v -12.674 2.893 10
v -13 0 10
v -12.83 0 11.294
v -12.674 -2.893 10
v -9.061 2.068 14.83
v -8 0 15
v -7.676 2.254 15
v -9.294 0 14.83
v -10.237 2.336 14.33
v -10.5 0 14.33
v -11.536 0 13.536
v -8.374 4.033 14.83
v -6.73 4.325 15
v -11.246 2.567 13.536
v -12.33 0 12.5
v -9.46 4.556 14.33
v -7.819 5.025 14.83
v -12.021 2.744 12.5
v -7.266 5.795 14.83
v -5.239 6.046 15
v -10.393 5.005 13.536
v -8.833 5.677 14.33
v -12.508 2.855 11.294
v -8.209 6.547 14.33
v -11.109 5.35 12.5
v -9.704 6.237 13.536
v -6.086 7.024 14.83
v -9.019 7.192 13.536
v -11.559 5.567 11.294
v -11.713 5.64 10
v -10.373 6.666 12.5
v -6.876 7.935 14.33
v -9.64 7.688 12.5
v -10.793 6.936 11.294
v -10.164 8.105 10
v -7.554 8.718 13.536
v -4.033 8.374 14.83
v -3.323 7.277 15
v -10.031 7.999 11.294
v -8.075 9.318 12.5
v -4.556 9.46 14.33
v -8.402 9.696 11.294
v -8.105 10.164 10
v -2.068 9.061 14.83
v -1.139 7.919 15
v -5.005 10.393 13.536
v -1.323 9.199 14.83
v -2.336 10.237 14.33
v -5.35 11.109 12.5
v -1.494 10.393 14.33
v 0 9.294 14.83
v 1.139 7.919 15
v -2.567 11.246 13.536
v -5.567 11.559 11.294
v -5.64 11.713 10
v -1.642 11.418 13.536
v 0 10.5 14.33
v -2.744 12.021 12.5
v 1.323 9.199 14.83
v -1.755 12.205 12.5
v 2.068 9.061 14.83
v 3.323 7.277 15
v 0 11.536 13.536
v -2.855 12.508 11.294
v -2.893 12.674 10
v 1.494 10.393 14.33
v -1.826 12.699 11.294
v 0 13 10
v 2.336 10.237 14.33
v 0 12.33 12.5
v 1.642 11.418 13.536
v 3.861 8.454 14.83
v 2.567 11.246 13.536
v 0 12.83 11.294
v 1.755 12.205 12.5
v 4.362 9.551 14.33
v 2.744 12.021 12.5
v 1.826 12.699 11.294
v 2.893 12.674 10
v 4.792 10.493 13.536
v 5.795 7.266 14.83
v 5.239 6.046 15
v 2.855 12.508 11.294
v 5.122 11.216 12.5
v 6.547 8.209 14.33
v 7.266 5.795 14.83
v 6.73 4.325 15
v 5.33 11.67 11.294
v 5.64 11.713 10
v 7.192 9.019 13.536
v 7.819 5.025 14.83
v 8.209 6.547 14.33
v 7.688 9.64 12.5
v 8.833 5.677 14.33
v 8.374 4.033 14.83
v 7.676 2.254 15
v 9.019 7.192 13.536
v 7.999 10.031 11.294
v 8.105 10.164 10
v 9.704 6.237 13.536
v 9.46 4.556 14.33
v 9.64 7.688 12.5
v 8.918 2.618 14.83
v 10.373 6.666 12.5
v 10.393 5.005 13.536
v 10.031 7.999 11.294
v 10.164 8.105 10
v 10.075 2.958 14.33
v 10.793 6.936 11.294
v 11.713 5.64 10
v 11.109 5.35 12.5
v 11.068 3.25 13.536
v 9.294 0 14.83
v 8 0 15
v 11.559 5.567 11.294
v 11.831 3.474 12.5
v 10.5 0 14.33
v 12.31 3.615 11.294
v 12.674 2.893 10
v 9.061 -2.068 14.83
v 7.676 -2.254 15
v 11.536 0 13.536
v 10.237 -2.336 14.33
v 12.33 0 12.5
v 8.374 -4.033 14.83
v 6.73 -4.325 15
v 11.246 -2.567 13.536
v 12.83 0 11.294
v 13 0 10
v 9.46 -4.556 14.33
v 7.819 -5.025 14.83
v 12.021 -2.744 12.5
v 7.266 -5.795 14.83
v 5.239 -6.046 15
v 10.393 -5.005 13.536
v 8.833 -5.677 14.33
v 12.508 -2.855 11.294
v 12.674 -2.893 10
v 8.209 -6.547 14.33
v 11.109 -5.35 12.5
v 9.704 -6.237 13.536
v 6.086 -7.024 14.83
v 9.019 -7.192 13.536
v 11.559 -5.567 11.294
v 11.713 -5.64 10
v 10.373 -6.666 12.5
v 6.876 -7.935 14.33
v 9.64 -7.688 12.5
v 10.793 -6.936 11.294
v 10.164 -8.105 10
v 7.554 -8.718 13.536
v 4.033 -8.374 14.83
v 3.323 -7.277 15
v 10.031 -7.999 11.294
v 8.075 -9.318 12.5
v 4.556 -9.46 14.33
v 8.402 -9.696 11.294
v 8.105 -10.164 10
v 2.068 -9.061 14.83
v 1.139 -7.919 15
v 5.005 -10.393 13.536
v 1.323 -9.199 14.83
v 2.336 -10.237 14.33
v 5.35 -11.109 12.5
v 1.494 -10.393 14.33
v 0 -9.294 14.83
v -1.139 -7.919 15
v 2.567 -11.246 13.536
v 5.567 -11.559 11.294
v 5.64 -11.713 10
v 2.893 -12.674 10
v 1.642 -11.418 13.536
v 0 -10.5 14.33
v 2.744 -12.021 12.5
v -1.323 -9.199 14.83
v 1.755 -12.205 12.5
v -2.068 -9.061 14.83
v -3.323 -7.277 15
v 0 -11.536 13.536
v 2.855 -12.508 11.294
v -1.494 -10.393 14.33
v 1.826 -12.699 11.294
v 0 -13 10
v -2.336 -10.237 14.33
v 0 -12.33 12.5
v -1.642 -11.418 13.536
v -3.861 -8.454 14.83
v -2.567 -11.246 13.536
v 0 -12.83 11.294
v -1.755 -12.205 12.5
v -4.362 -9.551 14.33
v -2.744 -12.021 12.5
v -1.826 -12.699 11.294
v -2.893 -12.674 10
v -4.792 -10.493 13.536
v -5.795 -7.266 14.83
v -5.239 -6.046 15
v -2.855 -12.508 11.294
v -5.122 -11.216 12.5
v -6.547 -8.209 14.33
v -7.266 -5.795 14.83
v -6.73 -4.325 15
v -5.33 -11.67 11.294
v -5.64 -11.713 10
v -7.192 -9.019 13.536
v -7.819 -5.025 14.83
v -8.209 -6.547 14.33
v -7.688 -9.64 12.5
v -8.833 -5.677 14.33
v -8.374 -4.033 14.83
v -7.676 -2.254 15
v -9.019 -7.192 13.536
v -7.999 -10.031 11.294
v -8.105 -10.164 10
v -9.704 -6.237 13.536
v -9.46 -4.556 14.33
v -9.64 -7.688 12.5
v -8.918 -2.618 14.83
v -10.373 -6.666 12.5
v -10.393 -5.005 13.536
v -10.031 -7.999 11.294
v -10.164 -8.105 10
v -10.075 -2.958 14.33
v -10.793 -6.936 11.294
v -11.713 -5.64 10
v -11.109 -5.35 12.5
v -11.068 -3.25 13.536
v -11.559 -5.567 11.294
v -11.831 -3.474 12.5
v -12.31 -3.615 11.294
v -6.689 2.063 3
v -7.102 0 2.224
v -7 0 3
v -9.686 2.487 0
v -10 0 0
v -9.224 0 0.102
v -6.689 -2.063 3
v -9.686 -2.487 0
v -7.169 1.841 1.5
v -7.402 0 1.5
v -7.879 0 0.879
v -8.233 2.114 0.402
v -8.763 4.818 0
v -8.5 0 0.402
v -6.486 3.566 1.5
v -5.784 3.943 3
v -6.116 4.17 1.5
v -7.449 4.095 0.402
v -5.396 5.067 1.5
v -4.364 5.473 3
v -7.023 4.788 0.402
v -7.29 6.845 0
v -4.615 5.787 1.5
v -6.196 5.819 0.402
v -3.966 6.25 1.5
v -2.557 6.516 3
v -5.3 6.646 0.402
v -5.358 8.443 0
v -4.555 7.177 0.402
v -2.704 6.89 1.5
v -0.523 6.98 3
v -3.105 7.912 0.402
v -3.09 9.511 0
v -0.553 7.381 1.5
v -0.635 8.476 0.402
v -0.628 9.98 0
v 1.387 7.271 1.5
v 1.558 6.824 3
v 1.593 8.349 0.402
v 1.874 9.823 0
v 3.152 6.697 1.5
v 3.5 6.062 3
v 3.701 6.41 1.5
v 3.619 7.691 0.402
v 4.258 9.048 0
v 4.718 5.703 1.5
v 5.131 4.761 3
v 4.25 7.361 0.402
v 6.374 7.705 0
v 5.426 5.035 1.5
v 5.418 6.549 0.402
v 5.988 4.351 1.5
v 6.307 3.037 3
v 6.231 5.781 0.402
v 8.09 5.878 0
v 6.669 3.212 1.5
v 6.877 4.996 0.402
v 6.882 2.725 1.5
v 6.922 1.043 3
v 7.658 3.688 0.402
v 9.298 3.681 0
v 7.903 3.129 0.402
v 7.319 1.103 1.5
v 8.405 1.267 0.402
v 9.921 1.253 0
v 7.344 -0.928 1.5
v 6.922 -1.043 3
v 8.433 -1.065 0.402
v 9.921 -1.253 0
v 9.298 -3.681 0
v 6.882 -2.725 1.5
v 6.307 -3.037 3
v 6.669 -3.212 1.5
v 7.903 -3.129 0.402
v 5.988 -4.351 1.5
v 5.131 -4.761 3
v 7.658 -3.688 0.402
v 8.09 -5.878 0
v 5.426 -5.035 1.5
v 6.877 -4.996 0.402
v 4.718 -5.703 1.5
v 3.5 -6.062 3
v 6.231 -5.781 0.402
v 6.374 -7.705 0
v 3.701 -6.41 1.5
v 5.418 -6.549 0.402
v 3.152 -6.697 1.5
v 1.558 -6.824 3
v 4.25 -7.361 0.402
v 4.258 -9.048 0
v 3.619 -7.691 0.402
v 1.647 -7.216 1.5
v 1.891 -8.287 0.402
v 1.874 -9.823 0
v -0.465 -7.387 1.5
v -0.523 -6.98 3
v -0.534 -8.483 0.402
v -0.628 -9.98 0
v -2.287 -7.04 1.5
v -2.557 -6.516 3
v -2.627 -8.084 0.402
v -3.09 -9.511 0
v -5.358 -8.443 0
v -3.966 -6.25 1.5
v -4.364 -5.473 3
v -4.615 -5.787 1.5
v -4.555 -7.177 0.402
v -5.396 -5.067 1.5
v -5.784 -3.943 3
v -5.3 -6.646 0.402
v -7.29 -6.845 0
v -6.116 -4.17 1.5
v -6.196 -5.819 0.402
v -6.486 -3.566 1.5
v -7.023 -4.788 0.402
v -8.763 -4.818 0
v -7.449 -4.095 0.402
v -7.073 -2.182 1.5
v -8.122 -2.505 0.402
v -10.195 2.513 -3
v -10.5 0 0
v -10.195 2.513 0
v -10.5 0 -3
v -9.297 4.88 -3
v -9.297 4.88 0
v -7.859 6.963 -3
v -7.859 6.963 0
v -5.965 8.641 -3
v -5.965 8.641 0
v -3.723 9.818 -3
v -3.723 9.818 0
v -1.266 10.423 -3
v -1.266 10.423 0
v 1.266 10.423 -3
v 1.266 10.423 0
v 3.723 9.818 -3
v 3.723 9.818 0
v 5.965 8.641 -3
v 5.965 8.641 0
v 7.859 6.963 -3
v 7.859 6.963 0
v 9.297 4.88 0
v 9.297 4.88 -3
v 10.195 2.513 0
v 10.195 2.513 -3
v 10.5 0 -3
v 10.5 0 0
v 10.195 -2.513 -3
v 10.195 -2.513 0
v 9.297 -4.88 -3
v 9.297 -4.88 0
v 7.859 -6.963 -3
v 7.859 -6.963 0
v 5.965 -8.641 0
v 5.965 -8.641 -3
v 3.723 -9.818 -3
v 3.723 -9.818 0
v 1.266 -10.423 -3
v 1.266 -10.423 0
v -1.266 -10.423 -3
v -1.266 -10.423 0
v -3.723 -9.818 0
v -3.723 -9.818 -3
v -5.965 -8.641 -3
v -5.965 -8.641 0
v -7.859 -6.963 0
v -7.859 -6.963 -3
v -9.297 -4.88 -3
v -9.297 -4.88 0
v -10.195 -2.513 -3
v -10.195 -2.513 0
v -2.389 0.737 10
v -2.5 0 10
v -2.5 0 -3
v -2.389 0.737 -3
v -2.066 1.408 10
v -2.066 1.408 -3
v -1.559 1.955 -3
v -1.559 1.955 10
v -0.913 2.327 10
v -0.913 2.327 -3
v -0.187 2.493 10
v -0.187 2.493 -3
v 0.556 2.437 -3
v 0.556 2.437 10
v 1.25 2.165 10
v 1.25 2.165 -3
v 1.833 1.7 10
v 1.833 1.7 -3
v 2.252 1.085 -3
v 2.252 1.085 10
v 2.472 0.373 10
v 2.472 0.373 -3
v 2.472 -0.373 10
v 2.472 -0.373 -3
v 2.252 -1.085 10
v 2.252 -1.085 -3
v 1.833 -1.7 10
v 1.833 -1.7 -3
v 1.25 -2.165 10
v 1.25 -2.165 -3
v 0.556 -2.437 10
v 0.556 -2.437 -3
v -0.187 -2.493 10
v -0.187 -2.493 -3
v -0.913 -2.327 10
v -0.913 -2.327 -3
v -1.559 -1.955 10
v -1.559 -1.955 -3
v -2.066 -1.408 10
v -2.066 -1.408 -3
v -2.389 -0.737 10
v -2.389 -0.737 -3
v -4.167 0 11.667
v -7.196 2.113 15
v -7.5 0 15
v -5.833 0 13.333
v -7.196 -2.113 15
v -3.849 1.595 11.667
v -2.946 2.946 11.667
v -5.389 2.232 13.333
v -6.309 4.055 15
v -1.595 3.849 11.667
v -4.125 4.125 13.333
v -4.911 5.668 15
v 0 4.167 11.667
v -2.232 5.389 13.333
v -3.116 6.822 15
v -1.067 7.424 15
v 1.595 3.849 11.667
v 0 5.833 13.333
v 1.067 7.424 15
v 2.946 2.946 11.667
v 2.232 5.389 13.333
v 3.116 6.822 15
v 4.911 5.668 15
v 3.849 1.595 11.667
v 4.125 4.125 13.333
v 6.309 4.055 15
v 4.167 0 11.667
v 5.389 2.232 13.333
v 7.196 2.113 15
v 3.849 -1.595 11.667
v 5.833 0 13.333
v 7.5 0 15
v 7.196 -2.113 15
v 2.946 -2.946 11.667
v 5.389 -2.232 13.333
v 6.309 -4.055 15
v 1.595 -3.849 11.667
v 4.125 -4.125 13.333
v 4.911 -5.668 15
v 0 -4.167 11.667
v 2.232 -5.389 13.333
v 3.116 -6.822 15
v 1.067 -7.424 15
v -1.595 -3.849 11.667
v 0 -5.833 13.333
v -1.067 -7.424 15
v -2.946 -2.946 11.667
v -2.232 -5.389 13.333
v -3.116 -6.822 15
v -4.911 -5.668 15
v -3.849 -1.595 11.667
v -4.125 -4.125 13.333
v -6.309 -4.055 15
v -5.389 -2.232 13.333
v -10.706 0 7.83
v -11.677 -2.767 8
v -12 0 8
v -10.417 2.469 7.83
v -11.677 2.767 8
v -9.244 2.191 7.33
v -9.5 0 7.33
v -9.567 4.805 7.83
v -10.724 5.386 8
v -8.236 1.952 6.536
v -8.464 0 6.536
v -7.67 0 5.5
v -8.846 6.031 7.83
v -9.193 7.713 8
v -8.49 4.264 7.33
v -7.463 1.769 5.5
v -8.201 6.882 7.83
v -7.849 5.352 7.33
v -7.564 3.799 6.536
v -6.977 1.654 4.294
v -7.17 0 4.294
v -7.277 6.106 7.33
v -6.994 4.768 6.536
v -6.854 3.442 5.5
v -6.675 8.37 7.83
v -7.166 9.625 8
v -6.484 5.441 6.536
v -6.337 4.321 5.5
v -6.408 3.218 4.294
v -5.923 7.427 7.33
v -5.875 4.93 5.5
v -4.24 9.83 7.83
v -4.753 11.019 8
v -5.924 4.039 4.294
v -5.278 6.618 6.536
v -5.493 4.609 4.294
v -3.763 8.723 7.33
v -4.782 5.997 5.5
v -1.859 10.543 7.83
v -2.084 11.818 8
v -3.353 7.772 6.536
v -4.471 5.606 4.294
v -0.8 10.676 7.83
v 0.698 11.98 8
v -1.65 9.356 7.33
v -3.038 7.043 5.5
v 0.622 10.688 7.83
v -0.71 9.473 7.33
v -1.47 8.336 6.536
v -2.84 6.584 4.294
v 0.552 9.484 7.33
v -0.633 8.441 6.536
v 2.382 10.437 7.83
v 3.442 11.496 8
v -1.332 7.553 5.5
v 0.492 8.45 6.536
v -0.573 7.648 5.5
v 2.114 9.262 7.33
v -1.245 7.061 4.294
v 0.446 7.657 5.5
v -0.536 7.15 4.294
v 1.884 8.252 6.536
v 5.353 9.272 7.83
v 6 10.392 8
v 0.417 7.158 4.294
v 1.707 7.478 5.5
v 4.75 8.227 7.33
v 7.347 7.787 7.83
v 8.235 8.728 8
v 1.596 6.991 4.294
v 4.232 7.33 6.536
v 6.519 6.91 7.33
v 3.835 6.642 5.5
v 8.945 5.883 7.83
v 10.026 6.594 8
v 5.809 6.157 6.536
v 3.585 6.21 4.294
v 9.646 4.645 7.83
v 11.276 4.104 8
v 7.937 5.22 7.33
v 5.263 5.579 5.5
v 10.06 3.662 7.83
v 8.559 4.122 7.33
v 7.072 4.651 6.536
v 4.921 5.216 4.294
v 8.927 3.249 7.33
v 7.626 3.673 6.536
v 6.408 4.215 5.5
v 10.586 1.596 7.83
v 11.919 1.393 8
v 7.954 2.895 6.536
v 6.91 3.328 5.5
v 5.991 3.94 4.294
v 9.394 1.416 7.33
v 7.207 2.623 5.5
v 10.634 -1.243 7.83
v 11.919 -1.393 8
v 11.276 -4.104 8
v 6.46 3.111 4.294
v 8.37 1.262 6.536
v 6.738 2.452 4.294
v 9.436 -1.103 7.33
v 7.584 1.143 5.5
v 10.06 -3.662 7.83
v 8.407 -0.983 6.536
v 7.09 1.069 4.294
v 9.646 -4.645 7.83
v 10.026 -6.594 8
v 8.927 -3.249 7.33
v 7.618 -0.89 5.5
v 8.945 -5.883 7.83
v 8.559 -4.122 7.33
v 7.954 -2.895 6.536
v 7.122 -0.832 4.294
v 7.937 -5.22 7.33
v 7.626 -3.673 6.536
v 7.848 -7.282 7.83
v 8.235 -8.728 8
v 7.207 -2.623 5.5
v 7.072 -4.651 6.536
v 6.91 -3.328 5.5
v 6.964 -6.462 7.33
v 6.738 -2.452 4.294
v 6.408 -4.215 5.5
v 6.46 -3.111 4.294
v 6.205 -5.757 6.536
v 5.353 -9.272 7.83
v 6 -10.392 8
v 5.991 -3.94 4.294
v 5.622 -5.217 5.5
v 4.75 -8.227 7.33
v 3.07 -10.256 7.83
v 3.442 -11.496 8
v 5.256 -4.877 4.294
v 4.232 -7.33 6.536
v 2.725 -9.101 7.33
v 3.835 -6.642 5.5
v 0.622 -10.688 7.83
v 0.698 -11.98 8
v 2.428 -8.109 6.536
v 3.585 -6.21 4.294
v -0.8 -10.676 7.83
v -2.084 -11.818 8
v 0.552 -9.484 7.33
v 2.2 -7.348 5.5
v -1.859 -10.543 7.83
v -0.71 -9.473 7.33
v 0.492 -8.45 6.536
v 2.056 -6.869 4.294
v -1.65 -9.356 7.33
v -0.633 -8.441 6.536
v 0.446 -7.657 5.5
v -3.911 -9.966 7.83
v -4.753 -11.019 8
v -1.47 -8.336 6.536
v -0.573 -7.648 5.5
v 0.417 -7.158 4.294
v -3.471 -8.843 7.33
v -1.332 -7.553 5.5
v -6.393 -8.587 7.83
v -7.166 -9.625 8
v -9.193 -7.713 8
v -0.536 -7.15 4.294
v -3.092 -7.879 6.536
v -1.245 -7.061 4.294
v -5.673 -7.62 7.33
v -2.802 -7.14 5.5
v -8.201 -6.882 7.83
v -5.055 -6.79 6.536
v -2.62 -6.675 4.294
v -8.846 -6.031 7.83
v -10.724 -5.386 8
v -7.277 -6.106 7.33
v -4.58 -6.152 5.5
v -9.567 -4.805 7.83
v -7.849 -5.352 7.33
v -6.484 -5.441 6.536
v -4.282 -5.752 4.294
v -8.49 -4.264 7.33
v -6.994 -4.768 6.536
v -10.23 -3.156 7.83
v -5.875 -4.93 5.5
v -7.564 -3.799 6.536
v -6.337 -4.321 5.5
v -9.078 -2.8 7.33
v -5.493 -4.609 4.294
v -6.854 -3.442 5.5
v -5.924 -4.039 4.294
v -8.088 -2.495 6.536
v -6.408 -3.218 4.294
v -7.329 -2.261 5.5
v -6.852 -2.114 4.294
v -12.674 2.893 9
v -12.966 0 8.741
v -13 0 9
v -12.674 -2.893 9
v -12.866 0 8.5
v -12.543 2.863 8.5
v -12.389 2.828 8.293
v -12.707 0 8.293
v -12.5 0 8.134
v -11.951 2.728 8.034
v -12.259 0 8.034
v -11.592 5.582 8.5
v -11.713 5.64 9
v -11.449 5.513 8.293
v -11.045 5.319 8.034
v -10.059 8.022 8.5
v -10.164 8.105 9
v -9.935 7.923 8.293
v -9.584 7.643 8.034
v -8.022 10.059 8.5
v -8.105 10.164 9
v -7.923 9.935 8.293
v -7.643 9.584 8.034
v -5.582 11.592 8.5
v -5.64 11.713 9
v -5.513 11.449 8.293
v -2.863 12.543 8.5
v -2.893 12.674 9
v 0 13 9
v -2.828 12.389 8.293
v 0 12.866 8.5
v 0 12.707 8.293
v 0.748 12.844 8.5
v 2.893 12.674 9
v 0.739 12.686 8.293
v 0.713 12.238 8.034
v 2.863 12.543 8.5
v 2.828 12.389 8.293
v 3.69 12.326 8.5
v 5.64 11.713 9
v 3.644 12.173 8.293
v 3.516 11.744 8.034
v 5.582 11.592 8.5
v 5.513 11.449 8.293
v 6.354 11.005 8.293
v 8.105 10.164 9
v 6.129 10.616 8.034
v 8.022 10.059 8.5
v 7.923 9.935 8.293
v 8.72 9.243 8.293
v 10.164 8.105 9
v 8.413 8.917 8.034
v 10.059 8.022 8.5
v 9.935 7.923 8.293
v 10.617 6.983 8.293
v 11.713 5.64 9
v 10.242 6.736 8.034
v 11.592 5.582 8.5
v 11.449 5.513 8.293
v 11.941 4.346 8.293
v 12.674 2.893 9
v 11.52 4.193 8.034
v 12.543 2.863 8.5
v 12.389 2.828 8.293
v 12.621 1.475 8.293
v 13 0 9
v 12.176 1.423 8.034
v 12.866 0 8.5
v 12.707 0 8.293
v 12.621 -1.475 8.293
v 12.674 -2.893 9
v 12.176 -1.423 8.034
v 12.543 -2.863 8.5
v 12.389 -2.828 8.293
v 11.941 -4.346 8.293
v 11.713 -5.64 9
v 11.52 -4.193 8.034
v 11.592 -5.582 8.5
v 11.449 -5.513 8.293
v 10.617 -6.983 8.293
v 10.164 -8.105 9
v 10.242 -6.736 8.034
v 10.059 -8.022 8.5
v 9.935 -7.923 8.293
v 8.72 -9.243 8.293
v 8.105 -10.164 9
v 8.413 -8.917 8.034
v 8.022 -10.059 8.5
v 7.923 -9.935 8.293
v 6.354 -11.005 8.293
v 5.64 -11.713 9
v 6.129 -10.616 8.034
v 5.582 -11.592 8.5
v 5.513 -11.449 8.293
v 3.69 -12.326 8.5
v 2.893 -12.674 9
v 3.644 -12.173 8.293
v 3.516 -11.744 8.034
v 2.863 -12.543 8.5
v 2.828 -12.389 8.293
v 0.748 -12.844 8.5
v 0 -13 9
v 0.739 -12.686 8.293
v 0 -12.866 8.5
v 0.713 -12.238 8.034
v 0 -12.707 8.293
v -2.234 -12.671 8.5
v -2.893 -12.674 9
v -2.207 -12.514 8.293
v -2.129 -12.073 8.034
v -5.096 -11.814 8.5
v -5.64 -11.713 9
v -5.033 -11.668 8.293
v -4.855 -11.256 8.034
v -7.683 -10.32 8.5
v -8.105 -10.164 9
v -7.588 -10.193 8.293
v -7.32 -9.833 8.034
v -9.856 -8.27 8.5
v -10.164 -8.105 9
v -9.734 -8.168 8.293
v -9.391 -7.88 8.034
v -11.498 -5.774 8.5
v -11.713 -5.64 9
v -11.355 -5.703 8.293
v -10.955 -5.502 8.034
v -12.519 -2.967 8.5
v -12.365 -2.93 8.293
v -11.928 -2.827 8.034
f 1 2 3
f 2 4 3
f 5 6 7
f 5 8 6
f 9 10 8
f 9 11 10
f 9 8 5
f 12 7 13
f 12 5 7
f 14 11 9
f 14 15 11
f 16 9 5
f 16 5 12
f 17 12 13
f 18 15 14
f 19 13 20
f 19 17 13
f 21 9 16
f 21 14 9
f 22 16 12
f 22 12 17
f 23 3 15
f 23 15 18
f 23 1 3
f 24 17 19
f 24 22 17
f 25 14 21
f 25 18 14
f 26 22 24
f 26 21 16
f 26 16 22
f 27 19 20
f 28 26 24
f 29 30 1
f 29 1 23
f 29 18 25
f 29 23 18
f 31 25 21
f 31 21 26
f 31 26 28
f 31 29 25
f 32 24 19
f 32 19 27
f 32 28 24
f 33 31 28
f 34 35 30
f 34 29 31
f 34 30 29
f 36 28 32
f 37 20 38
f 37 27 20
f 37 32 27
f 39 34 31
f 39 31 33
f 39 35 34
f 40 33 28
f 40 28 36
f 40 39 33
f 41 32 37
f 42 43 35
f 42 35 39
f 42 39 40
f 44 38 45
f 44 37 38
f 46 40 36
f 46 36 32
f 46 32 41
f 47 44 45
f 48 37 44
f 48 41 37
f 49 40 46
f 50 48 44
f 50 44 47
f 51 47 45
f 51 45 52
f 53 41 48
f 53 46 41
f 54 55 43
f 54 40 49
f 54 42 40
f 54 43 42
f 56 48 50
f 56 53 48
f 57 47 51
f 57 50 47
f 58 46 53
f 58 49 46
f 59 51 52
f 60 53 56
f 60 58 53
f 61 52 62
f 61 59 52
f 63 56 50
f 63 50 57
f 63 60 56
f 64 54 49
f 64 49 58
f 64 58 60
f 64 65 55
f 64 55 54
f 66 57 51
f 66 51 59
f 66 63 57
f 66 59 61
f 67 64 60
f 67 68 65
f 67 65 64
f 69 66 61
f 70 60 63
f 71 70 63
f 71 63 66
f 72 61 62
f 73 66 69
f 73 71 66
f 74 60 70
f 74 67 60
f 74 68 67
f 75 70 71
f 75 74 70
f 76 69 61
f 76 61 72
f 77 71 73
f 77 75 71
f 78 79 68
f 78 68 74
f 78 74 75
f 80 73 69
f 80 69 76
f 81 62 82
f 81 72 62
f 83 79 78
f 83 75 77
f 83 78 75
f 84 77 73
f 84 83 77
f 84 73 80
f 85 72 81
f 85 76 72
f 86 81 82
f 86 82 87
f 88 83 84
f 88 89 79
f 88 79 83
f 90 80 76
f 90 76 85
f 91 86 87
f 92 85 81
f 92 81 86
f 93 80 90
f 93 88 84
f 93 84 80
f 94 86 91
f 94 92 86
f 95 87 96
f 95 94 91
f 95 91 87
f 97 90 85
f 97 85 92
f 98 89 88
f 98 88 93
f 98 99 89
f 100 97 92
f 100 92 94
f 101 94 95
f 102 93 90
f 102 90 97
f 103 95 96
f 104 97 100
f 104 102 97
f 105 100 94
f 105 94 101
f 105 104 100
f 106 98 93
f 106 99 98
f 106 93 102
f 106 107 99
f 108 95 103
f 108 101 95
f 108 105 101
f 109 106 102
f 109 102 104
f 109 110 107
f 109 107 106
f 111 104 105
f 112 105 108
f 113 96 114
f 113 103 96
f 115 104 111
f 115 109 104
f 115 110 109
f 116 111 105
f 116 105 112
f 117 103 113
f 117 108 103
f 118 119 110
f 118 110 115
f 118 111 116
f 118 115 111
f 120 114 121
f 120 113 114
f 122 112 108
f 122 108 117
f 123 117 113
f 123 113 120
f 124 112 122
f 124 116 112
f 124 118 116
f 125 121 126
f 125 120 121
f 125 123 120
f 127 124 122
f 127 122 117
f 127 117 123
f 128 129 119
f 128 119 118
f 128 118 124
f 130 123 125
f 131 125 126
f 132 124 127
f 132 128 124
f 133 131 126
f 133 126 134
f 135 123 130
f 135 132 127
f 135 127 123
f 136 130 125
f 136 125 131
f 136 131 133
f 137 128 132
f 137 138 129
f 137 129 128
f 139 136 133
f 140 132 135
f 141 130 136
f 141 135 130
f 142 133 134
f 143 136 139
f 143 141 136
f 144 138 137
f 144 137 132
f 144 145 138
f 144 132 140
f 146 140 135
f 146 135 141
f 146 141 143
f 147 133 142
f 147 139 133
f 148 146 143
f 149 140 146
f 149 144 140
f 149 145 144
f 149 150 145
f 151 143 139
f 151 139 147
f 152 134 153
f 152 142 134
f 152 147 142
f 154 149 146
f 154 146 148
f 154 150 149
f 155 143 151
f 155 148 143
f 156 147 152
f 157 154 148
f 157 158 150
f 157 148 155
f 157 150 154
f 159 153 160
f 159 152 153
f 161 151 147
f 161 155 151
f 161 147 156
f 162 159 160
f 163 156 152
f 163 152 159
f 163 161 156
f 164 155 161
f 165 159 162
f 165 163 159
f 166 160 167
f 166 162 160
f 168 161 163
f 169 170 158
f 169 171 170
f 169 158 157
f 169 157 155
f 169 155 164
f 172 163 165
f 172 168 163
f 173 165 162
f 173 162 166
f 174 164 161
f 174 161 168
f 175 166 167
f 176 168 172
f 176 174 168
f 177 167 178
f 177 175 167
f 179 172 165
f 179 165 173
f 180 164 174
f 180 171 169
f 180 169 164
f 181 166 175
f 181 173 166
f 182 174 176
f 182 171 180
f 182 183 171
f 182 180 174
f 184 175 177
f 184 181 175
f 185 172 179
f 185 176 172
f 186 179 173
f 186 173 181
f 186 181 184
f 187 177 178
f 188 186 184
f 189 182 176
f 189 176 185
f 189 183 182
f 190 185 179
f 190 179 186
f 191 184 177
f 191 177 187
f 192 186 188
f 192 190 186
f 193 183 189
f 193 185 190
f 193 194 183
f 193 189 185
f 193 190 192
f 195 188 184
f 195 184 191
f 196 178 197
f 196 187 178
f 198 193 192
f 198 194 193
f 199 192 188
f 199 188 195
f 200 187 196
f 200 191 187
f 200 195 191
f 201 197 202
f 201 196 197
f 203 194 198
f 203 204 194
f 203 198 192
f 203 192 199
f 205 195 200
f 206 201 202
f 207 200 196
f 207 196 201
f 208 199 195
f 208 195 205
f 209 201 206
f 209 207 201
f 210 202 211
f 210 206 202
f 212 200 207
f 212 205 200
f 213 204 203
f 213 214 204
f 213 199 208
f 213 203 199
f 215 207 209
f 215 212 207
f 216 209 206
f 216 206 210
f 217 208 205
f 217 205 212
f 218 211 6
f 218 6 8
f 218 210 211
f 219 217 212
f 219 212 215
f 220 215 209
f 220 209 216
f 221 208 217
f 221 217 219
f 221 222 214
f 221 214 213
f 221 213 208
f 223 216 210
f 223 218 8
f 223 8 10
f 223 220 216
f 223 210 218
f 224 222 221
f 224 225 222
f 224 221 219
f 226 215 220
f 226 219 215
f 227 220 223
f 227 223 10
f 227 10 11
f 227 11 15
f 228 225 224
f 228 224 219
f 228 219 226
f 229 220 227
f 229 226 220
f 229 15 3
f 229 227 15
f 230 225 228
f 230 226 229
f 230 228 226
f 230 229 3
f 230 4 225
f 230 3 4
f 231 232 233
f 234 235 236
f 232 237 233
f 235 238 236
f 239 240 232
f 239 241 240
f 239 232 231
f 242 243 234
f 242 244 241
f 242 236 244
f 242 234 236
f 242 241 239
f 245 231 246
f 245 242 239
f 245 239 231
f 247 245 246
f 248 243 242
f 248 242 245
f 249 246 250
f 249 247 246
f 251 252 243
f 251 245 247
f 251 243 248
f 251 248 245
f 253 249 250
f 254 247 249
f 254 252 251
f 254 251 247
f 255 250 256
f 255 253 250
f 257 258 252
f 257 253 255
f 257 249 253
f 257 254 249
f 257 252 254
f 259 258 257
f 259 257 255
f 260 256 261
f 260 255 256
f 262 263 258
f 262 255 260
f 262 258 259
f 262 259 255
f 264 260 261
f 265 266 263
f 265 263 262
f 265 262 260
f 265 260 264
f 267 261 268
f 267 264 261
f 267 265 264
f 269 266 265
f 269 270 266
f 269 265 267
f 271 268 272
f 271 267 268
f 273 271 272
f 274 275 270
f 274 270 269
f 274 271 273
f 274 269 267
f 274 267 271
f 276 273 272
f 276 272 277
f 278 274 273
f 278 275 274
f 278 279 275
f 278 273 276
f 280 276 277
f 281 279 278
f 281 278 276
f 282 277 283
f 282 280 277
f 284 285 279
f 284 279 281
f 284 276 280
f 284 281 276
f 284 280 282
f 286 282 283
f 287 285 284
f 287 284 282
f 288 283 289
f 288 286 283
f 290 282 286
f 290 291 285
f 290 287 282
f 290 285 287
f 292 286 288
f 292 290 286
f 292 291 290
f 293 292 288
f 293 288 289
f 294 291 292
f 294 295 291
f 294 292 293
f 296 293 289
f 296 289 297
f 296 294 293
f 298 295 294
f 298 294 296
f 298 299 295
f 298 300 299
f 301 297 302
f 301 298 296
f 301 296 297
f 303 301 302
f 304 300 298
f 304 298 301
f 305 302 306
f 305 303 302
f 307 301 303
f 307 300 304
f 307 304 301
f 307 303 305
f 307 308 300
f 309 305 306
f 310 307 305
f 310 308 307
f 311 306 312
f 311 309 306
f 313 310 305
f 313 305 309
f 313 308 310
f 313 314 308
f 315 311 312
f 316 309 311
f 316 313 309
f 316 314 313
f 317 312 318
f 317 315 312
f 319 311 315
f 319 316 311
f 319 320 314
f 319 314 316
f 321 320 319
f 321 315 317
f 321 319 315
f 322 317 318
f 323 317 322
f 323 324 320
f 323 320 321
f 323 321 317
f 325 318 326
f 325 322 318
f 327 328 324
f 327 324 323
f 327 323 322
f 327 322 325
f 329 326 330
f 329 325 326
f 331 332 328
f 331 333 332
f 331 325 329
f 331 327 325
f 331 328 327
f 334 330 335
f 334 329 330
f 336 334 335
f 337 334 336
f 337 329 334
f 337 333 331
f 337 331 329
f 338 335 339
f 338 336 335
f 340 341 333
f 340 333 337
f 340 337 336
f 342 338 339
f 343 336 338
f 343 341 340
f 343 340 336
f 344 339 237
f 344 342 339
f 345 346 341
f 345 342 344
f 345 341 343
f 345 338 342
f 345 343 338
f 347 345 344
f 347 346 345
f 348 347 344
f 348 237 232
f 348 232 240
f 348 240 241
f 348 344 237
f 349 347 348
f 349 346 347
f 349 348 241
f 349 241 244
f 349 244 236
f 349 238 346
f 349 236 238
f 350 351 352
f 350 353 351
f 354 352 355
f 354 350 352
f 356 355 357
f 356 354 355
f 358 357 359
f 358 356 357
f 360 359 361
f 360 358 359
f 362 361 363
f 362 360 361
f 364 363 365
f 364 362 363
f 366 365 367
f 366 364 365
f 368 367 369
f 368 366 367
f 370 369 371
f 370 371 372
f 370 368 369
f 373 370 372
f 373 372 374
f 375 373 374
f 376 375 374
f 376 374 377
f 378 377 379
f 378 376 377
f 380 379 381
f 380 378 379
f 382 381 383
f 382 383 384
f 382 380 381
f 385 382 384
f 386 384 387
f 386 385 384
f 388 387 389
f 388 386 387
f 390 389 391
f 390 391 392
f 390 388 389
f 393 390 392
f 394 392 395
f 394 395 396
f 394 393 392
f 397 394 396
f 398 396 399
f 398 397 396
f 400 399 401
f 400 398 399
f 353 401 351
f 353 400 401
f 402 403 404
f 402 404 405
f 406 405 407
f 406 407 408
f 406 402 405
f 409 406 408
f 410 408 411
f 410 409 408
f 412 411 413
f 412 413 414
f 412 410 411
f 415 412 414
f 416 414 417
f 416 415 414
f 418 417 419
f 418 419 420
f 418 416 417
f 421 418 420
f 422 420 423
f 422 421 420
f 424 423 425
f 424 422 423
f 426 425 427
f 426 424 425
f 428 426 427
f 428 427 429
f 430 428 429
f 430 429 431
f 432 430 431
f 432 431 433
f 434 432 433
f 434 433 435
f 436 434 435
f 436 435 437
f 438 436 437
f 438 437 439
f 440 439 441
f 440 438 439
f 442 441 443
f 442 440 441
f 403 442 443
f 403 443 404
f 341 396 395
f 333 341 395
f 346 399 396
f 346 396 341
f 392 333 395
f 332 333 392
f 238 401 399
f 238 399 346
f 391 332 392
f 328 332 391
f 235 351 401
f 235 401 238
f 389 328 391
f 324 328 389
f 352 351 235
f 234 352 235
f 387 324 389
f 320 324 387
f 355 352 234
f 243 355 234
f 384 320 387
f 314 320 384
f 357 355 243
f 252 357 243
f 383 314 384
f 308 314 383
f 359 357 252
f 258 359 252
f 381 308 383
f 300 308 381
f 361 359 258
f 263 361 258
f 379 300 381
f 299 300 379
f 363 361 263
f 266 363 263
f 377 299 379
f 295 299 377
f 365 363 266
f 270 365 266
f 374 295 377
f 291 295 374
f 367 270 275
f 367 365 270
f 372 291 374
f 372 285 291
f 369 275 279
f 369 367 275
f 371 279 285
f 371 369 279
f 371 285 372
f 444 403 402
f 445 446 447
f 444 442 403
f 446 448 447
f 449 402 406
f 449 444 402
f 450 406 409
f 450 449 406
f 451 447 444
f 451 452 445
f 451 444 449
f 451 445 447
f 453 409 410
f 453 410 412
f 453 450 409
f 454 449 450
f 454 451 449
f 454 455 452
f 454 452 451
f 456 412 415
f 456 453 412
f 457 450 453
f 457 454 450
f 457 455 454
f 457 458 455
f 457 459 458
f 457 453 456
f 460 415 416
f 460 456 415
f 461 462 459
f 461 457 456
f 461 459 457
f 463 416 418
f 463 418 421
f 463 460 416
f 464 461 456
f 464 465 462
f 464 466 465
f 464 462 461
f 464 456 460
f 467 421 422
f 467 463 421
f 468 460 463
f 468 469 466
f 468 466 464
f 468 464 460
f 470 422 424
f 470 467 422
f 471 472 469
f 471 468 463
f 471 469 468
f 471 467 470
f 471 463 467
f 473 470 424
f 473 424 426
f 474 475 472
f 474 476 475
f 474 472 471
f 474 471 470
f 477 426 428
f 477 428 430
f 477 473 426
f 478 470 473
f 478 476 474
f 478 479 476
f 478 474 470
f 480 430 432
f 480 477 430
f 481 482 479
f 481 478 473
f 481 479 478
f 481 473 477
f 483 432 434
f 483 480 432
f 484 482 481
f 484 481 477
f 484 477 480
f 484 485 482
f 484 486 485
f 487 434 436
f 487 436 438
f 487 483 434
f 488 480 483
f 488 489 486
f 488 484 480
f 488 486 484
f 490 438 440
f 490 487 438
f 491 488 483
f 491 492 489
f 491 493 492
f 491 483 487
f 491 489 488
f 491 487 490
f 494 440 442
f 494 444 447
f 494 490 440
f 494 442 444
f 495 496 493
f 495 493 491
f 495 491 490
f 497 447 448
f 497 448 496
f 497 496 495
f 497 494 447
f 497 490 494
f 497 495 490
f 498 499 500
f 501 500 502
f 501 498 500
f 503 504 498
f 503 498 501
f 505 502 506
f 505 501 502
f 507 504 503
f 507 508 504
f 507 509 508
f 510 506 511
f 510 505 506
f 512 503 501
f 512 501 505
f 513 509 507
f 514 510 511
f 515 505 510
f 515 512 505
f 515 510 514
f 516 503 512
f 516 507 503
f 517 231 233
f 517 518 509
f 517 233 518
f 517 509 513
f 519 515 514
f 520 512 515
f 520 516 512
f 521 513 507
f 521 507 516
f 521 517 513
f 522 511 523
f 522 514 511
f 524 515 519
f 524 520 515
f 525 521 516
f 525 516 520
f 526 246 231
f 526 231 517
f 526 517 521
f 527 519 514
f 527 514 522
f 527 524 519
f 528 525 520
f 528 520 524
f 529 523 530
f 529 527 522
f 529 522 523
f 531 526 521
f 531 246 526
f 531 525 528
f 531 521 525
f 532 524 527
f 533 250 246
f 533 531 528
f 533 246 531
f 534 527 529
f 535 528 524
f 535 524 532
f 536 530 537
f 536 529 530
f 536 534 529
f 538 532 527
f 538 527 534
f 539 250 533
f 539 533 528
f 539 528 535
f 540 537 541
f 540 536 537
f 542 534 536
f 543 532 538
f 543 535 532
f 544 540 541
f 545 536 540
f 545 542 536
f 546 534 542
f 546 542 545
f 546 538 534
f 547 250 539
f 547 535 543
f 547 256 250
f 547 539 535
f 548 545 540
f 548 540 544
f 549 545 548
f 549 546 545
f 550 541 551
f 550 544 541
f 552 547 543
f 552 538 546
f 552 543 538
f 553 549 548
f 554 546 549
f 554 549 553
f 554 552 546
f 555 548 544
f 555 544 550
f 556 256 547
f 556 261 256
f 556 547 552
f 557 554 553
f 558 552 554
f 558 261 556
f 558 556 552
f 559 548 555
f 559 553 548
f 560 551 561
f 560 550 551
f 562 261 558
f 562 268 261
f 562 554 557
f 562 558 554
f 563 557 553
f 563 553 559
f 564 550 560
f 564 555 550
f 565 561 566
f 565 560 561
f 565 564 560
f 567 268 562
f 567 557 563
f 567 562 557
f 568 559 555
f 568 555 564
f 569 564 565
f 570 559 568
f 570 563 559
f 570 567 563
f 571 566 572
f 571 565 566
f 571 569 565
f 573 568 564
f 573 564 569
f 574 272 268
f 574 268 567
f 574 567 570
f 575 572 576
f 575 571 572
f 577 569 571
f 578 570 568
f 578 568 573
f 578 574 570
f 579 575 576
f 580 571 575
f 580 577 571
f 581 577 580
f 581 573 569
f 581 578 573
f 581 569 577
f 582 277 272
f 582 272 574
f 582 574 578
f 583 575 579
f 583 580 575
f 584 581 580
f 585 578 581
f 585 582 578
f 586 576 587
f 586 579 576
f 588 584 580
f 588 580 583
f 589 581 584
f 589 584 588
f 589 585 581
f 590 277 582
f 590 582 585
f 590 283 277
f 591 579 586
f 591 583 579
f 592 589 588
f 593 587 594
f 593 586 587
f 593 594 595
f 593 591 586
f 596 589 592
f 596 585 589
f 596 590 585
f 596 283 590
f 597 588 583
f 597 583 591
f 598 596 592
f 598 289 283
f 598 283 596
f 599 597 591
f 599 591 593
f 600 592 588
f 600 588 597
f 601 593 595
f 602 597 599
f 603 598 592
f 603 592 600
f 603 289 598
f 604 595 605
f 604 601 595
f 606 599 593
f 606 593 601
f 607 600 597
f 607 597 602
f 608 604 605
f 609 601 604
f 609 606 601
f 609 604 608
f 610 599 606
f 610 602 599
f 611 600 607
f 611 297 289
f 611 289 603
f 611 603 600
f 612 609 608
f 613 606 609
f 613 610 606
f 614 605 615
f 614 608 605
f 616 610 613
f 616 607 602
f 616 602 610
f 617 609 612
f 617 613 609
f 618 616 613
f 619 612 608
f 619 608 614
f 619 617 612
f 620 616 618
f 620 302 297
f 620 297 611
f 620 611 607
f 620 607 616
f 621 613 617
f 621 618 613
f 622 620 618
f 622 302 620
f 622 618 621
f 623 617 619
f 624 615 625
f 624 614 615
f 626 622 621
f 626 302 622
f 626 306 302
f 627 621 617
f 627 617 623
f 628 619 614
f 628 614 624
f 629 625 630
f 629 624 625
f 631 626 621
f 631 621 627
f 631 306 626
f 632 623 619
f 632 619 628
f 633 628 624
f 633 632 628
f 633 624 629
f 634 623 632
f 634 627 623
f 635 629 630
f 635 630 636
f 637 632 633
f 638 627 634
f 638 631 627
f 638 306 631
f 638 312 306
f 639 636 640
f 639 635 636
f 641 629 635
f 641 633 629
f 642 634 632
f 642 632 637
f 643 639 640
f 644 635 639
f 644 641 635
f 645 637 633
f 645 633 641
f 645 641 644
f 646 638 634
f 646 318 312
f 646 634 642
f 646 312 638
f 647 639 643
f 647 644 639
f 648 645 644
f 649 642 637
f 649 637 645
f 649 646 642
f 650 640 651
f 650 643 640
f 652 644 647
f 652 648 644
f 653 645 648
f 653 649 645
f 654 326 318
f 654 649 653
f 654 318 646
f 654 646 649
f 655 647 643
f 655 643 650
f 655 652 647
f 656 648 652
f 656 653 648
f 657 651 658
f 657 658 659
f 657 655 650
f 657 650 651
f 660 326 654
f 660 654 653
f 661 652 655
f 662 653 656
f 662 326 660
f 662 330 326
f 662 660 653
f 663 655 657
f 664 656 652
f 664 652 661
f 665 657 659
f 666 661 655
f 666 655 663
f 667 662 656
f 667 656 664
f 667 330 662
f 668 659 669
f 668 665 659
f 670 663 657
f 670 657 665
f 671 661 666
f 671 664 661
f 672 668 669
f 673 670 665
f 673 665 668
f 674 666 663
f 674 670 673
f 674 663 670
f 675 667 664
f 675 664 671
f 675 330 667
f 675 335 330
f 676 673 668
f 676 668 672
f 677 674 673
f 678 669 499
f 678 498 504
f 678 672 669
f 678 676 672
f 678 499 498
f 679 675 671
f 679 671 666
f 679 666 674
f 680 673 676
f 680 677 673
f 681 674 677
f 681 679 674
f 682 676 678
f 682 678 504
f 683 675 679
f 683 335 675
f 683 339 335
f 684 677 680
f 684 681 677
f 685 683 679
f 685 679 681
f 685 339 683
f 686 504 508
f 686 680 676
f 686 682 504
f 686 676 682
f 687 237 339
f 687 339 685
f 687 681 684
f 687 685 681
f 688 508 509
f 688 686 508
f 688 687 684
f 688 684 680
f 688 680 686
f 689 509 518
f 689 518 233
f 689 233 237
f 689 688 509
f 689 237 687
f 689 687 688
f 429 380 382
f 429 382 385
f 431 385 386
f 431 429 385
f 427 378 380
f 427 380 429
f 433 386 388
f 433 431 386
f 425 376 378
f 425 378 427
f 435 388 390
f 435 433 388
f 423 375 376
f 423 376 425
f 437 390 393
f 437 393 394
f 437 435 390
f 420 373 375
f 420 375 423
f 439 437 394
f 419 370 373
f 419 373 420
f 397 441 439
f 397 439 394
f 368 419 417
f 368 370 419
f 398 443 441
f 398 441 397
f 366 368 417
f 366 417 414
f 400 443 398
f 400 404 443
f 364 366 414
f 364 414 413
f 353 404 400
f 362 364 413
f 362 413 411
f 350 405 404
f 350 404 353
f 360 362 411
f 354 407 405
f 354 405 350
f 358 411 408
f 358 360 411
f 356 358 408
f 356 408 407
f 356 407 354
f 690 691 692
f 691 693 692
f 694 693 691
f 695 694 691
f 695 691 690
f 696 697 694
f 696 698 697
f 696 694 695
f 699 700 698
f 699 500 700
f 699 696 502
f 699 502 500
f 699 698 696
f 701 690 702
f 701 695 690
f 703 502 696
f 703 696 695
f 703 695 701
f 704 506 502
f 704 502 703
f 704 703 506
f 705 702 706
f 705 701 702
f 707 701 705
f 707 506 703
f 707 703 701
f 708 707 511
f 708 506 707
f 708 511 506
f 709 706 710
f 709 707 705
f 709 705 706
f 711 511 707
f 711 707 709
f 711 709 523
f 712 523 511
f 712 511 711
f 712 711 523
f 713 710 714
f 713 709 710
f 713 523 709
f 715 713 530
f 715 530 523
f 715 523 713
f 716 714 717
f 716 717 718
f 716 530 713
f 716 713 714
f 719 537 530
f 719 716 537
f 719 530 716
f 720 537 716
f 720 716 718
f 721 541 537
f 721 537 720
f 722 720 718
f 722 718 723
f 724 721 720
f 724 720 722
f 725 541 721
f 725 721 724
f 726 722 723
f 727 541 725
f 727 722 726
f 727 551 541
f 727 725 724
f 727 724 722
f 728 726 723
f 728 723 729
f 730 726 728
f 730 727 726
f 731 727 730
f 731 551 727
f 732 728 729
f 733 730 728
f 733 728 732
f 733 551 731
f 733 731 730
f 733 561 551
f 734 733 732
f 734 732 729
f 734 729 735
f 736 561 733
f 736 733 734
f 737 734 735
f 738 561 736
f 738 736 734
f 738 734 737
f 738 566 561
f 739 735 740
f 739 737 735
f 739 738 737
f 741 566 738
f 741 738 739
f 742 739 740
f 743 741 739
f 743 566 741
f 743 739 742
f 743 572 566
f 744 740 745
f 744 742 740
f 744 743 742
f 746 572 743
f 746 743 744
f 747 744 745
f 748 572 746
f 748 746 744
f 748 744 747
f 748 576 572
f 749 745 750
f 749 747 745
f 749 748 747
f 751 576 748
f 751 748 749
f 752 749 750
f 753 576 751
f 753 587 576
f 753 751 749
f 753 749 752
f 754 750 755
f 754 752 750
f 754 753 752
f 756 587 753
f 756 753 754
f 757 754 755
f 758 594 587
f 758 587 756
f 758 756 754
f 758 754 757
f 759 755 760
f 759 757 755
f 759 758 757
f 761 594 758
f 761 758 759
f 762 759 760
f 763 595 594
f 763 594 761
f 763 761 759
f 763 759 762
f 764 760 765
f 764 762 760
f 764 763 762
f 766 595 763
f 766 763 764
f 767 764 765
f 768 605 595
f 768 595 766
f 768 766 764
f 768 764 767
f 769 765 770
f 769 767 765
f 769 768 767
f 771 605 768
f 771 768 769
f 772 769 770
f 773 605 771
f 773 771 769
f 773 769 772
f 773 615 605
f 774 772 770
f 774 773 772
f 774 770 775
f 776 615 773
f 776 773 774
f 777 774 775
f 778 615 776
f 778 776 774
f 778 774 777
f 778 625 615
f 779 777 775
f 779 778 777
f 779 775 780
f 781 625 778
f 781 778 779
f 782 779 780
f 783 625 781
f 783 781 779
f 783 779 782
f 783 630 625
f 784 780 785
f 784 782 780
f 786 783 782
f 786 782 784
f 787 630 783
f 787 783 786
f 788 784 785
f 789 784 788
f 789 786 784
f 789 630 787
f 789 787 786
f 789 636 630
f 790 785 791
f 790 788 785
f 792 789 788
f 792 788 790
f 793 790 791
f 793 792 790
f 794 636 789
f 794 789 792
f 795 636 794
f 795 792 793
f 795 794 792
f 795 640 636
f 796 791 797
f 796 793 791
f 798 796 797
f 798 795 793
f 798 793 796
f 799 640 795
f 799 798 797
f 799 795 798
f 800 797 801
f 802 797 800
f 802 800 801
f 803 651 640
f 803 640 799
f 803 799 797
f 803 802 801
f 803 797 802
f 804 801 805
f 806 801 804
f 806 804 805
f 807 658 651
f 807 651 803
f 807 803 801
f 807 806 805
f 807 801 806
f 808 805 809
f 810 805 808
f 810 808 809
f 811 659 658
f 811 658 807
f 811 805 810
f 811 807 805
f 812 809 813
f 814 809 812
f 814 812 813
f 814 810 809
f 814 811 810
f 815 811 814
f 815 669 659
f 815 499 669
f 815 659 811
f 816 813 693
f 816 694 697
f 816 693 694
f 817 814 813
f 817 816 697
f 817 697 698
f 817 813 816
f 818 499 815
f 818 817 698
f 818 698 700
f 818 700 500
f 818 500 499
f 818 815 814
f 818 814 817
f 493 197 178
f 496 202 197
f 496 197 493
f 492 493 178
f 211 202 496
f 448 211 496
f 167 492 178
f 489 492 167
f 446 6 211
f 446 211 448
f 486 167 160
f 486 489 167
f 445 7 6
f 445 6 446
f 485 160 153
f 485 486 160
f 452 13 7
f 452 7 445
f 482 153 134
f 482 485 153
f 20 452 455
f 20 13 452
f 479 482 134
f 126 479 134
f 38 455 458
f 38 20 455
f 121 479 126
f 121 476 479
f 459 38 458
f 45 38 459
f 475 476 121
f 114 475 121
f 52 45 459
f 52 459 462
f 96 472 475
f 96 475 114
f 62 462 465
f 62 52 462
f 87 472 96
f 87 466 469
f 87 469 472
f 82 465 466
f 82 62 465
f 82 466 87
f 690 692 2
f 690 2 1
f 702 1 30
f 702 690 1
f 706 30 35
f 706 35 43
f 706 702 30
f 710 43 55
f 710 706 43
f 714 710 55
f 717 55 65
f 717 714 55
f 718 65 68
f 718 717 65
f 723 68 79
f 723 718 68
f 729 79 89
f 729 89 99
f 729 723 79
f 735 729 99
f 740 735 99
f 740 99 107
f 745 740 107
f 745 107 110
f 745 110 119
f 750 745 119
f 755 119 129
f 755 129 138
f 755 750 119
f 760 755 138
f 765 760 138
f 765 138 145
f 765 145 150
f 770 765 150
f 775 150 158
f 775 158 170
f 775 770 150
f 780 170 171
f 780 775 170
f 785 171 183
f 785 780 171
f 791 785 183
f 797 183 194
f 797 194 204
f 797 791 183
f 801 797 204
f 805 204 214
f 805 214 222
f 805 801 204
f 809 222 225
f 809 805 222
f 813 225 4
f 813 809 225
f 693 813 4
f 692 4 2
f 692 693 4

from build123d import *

# Parameters (mm, degrees)
F2_SIZE = 5
F3_R    = 0.99999


# Not quite as in the source:
# - a fillet or chamfer is up to 0.001 mm smaller than in the source, because OpenCascade refuses the exact size


with BuildPart() as f1:
    # F0 (on Front) → F1 (revolve)
    with BuildSketch(Plane.XZ):
        with BuildLine():
            Line((-2.5, -3), (-2.5, 0))
            Line((-2.5, 0), (-2.5, 15))
            Line((-2.5, 15), (-8, 15))
            ThreePointArc((-8, 15), (-11.5355339059, 13.5355339059), (-13, 10))
            Line((-13, 10), (-13, 8))
            Line((-13, 8), (-12, 8))
            ThreePointArc((-12, 8), (-8.4644660941, 6.5355339059), (-7, 3))
            ThreePointArc((-7, 3), (-7.8786796564, 0.8786796564), (-10, 0))
            Line((-10, 0), (-10.5, 0))
            Line((-10.5, 0), (-10.5, -3))
            Line((-10.5, -3), (-2.5, -3))
        make_face()
    revolve(axis=Axis((0, 0, 3.244361095), (0, 0, -1)))

    # F2
    f2_edges = [f1.edges().sort_by_distance(p)[0] for p in [
        (2.5, 0, 15),
    ]]
    chamfer(f2_edges, length=F2_SIZE)

    # F3 (radius 1 in the source; OpenCascade refuses exactly that, so slightly less here)
    f3_edges = [f1.edges().sort_by_distance(p)[0] for p in [
        (13, 0, 8),
    ]]
    fillet(f3_edges, radius=F3_R)


solid = f1.part
